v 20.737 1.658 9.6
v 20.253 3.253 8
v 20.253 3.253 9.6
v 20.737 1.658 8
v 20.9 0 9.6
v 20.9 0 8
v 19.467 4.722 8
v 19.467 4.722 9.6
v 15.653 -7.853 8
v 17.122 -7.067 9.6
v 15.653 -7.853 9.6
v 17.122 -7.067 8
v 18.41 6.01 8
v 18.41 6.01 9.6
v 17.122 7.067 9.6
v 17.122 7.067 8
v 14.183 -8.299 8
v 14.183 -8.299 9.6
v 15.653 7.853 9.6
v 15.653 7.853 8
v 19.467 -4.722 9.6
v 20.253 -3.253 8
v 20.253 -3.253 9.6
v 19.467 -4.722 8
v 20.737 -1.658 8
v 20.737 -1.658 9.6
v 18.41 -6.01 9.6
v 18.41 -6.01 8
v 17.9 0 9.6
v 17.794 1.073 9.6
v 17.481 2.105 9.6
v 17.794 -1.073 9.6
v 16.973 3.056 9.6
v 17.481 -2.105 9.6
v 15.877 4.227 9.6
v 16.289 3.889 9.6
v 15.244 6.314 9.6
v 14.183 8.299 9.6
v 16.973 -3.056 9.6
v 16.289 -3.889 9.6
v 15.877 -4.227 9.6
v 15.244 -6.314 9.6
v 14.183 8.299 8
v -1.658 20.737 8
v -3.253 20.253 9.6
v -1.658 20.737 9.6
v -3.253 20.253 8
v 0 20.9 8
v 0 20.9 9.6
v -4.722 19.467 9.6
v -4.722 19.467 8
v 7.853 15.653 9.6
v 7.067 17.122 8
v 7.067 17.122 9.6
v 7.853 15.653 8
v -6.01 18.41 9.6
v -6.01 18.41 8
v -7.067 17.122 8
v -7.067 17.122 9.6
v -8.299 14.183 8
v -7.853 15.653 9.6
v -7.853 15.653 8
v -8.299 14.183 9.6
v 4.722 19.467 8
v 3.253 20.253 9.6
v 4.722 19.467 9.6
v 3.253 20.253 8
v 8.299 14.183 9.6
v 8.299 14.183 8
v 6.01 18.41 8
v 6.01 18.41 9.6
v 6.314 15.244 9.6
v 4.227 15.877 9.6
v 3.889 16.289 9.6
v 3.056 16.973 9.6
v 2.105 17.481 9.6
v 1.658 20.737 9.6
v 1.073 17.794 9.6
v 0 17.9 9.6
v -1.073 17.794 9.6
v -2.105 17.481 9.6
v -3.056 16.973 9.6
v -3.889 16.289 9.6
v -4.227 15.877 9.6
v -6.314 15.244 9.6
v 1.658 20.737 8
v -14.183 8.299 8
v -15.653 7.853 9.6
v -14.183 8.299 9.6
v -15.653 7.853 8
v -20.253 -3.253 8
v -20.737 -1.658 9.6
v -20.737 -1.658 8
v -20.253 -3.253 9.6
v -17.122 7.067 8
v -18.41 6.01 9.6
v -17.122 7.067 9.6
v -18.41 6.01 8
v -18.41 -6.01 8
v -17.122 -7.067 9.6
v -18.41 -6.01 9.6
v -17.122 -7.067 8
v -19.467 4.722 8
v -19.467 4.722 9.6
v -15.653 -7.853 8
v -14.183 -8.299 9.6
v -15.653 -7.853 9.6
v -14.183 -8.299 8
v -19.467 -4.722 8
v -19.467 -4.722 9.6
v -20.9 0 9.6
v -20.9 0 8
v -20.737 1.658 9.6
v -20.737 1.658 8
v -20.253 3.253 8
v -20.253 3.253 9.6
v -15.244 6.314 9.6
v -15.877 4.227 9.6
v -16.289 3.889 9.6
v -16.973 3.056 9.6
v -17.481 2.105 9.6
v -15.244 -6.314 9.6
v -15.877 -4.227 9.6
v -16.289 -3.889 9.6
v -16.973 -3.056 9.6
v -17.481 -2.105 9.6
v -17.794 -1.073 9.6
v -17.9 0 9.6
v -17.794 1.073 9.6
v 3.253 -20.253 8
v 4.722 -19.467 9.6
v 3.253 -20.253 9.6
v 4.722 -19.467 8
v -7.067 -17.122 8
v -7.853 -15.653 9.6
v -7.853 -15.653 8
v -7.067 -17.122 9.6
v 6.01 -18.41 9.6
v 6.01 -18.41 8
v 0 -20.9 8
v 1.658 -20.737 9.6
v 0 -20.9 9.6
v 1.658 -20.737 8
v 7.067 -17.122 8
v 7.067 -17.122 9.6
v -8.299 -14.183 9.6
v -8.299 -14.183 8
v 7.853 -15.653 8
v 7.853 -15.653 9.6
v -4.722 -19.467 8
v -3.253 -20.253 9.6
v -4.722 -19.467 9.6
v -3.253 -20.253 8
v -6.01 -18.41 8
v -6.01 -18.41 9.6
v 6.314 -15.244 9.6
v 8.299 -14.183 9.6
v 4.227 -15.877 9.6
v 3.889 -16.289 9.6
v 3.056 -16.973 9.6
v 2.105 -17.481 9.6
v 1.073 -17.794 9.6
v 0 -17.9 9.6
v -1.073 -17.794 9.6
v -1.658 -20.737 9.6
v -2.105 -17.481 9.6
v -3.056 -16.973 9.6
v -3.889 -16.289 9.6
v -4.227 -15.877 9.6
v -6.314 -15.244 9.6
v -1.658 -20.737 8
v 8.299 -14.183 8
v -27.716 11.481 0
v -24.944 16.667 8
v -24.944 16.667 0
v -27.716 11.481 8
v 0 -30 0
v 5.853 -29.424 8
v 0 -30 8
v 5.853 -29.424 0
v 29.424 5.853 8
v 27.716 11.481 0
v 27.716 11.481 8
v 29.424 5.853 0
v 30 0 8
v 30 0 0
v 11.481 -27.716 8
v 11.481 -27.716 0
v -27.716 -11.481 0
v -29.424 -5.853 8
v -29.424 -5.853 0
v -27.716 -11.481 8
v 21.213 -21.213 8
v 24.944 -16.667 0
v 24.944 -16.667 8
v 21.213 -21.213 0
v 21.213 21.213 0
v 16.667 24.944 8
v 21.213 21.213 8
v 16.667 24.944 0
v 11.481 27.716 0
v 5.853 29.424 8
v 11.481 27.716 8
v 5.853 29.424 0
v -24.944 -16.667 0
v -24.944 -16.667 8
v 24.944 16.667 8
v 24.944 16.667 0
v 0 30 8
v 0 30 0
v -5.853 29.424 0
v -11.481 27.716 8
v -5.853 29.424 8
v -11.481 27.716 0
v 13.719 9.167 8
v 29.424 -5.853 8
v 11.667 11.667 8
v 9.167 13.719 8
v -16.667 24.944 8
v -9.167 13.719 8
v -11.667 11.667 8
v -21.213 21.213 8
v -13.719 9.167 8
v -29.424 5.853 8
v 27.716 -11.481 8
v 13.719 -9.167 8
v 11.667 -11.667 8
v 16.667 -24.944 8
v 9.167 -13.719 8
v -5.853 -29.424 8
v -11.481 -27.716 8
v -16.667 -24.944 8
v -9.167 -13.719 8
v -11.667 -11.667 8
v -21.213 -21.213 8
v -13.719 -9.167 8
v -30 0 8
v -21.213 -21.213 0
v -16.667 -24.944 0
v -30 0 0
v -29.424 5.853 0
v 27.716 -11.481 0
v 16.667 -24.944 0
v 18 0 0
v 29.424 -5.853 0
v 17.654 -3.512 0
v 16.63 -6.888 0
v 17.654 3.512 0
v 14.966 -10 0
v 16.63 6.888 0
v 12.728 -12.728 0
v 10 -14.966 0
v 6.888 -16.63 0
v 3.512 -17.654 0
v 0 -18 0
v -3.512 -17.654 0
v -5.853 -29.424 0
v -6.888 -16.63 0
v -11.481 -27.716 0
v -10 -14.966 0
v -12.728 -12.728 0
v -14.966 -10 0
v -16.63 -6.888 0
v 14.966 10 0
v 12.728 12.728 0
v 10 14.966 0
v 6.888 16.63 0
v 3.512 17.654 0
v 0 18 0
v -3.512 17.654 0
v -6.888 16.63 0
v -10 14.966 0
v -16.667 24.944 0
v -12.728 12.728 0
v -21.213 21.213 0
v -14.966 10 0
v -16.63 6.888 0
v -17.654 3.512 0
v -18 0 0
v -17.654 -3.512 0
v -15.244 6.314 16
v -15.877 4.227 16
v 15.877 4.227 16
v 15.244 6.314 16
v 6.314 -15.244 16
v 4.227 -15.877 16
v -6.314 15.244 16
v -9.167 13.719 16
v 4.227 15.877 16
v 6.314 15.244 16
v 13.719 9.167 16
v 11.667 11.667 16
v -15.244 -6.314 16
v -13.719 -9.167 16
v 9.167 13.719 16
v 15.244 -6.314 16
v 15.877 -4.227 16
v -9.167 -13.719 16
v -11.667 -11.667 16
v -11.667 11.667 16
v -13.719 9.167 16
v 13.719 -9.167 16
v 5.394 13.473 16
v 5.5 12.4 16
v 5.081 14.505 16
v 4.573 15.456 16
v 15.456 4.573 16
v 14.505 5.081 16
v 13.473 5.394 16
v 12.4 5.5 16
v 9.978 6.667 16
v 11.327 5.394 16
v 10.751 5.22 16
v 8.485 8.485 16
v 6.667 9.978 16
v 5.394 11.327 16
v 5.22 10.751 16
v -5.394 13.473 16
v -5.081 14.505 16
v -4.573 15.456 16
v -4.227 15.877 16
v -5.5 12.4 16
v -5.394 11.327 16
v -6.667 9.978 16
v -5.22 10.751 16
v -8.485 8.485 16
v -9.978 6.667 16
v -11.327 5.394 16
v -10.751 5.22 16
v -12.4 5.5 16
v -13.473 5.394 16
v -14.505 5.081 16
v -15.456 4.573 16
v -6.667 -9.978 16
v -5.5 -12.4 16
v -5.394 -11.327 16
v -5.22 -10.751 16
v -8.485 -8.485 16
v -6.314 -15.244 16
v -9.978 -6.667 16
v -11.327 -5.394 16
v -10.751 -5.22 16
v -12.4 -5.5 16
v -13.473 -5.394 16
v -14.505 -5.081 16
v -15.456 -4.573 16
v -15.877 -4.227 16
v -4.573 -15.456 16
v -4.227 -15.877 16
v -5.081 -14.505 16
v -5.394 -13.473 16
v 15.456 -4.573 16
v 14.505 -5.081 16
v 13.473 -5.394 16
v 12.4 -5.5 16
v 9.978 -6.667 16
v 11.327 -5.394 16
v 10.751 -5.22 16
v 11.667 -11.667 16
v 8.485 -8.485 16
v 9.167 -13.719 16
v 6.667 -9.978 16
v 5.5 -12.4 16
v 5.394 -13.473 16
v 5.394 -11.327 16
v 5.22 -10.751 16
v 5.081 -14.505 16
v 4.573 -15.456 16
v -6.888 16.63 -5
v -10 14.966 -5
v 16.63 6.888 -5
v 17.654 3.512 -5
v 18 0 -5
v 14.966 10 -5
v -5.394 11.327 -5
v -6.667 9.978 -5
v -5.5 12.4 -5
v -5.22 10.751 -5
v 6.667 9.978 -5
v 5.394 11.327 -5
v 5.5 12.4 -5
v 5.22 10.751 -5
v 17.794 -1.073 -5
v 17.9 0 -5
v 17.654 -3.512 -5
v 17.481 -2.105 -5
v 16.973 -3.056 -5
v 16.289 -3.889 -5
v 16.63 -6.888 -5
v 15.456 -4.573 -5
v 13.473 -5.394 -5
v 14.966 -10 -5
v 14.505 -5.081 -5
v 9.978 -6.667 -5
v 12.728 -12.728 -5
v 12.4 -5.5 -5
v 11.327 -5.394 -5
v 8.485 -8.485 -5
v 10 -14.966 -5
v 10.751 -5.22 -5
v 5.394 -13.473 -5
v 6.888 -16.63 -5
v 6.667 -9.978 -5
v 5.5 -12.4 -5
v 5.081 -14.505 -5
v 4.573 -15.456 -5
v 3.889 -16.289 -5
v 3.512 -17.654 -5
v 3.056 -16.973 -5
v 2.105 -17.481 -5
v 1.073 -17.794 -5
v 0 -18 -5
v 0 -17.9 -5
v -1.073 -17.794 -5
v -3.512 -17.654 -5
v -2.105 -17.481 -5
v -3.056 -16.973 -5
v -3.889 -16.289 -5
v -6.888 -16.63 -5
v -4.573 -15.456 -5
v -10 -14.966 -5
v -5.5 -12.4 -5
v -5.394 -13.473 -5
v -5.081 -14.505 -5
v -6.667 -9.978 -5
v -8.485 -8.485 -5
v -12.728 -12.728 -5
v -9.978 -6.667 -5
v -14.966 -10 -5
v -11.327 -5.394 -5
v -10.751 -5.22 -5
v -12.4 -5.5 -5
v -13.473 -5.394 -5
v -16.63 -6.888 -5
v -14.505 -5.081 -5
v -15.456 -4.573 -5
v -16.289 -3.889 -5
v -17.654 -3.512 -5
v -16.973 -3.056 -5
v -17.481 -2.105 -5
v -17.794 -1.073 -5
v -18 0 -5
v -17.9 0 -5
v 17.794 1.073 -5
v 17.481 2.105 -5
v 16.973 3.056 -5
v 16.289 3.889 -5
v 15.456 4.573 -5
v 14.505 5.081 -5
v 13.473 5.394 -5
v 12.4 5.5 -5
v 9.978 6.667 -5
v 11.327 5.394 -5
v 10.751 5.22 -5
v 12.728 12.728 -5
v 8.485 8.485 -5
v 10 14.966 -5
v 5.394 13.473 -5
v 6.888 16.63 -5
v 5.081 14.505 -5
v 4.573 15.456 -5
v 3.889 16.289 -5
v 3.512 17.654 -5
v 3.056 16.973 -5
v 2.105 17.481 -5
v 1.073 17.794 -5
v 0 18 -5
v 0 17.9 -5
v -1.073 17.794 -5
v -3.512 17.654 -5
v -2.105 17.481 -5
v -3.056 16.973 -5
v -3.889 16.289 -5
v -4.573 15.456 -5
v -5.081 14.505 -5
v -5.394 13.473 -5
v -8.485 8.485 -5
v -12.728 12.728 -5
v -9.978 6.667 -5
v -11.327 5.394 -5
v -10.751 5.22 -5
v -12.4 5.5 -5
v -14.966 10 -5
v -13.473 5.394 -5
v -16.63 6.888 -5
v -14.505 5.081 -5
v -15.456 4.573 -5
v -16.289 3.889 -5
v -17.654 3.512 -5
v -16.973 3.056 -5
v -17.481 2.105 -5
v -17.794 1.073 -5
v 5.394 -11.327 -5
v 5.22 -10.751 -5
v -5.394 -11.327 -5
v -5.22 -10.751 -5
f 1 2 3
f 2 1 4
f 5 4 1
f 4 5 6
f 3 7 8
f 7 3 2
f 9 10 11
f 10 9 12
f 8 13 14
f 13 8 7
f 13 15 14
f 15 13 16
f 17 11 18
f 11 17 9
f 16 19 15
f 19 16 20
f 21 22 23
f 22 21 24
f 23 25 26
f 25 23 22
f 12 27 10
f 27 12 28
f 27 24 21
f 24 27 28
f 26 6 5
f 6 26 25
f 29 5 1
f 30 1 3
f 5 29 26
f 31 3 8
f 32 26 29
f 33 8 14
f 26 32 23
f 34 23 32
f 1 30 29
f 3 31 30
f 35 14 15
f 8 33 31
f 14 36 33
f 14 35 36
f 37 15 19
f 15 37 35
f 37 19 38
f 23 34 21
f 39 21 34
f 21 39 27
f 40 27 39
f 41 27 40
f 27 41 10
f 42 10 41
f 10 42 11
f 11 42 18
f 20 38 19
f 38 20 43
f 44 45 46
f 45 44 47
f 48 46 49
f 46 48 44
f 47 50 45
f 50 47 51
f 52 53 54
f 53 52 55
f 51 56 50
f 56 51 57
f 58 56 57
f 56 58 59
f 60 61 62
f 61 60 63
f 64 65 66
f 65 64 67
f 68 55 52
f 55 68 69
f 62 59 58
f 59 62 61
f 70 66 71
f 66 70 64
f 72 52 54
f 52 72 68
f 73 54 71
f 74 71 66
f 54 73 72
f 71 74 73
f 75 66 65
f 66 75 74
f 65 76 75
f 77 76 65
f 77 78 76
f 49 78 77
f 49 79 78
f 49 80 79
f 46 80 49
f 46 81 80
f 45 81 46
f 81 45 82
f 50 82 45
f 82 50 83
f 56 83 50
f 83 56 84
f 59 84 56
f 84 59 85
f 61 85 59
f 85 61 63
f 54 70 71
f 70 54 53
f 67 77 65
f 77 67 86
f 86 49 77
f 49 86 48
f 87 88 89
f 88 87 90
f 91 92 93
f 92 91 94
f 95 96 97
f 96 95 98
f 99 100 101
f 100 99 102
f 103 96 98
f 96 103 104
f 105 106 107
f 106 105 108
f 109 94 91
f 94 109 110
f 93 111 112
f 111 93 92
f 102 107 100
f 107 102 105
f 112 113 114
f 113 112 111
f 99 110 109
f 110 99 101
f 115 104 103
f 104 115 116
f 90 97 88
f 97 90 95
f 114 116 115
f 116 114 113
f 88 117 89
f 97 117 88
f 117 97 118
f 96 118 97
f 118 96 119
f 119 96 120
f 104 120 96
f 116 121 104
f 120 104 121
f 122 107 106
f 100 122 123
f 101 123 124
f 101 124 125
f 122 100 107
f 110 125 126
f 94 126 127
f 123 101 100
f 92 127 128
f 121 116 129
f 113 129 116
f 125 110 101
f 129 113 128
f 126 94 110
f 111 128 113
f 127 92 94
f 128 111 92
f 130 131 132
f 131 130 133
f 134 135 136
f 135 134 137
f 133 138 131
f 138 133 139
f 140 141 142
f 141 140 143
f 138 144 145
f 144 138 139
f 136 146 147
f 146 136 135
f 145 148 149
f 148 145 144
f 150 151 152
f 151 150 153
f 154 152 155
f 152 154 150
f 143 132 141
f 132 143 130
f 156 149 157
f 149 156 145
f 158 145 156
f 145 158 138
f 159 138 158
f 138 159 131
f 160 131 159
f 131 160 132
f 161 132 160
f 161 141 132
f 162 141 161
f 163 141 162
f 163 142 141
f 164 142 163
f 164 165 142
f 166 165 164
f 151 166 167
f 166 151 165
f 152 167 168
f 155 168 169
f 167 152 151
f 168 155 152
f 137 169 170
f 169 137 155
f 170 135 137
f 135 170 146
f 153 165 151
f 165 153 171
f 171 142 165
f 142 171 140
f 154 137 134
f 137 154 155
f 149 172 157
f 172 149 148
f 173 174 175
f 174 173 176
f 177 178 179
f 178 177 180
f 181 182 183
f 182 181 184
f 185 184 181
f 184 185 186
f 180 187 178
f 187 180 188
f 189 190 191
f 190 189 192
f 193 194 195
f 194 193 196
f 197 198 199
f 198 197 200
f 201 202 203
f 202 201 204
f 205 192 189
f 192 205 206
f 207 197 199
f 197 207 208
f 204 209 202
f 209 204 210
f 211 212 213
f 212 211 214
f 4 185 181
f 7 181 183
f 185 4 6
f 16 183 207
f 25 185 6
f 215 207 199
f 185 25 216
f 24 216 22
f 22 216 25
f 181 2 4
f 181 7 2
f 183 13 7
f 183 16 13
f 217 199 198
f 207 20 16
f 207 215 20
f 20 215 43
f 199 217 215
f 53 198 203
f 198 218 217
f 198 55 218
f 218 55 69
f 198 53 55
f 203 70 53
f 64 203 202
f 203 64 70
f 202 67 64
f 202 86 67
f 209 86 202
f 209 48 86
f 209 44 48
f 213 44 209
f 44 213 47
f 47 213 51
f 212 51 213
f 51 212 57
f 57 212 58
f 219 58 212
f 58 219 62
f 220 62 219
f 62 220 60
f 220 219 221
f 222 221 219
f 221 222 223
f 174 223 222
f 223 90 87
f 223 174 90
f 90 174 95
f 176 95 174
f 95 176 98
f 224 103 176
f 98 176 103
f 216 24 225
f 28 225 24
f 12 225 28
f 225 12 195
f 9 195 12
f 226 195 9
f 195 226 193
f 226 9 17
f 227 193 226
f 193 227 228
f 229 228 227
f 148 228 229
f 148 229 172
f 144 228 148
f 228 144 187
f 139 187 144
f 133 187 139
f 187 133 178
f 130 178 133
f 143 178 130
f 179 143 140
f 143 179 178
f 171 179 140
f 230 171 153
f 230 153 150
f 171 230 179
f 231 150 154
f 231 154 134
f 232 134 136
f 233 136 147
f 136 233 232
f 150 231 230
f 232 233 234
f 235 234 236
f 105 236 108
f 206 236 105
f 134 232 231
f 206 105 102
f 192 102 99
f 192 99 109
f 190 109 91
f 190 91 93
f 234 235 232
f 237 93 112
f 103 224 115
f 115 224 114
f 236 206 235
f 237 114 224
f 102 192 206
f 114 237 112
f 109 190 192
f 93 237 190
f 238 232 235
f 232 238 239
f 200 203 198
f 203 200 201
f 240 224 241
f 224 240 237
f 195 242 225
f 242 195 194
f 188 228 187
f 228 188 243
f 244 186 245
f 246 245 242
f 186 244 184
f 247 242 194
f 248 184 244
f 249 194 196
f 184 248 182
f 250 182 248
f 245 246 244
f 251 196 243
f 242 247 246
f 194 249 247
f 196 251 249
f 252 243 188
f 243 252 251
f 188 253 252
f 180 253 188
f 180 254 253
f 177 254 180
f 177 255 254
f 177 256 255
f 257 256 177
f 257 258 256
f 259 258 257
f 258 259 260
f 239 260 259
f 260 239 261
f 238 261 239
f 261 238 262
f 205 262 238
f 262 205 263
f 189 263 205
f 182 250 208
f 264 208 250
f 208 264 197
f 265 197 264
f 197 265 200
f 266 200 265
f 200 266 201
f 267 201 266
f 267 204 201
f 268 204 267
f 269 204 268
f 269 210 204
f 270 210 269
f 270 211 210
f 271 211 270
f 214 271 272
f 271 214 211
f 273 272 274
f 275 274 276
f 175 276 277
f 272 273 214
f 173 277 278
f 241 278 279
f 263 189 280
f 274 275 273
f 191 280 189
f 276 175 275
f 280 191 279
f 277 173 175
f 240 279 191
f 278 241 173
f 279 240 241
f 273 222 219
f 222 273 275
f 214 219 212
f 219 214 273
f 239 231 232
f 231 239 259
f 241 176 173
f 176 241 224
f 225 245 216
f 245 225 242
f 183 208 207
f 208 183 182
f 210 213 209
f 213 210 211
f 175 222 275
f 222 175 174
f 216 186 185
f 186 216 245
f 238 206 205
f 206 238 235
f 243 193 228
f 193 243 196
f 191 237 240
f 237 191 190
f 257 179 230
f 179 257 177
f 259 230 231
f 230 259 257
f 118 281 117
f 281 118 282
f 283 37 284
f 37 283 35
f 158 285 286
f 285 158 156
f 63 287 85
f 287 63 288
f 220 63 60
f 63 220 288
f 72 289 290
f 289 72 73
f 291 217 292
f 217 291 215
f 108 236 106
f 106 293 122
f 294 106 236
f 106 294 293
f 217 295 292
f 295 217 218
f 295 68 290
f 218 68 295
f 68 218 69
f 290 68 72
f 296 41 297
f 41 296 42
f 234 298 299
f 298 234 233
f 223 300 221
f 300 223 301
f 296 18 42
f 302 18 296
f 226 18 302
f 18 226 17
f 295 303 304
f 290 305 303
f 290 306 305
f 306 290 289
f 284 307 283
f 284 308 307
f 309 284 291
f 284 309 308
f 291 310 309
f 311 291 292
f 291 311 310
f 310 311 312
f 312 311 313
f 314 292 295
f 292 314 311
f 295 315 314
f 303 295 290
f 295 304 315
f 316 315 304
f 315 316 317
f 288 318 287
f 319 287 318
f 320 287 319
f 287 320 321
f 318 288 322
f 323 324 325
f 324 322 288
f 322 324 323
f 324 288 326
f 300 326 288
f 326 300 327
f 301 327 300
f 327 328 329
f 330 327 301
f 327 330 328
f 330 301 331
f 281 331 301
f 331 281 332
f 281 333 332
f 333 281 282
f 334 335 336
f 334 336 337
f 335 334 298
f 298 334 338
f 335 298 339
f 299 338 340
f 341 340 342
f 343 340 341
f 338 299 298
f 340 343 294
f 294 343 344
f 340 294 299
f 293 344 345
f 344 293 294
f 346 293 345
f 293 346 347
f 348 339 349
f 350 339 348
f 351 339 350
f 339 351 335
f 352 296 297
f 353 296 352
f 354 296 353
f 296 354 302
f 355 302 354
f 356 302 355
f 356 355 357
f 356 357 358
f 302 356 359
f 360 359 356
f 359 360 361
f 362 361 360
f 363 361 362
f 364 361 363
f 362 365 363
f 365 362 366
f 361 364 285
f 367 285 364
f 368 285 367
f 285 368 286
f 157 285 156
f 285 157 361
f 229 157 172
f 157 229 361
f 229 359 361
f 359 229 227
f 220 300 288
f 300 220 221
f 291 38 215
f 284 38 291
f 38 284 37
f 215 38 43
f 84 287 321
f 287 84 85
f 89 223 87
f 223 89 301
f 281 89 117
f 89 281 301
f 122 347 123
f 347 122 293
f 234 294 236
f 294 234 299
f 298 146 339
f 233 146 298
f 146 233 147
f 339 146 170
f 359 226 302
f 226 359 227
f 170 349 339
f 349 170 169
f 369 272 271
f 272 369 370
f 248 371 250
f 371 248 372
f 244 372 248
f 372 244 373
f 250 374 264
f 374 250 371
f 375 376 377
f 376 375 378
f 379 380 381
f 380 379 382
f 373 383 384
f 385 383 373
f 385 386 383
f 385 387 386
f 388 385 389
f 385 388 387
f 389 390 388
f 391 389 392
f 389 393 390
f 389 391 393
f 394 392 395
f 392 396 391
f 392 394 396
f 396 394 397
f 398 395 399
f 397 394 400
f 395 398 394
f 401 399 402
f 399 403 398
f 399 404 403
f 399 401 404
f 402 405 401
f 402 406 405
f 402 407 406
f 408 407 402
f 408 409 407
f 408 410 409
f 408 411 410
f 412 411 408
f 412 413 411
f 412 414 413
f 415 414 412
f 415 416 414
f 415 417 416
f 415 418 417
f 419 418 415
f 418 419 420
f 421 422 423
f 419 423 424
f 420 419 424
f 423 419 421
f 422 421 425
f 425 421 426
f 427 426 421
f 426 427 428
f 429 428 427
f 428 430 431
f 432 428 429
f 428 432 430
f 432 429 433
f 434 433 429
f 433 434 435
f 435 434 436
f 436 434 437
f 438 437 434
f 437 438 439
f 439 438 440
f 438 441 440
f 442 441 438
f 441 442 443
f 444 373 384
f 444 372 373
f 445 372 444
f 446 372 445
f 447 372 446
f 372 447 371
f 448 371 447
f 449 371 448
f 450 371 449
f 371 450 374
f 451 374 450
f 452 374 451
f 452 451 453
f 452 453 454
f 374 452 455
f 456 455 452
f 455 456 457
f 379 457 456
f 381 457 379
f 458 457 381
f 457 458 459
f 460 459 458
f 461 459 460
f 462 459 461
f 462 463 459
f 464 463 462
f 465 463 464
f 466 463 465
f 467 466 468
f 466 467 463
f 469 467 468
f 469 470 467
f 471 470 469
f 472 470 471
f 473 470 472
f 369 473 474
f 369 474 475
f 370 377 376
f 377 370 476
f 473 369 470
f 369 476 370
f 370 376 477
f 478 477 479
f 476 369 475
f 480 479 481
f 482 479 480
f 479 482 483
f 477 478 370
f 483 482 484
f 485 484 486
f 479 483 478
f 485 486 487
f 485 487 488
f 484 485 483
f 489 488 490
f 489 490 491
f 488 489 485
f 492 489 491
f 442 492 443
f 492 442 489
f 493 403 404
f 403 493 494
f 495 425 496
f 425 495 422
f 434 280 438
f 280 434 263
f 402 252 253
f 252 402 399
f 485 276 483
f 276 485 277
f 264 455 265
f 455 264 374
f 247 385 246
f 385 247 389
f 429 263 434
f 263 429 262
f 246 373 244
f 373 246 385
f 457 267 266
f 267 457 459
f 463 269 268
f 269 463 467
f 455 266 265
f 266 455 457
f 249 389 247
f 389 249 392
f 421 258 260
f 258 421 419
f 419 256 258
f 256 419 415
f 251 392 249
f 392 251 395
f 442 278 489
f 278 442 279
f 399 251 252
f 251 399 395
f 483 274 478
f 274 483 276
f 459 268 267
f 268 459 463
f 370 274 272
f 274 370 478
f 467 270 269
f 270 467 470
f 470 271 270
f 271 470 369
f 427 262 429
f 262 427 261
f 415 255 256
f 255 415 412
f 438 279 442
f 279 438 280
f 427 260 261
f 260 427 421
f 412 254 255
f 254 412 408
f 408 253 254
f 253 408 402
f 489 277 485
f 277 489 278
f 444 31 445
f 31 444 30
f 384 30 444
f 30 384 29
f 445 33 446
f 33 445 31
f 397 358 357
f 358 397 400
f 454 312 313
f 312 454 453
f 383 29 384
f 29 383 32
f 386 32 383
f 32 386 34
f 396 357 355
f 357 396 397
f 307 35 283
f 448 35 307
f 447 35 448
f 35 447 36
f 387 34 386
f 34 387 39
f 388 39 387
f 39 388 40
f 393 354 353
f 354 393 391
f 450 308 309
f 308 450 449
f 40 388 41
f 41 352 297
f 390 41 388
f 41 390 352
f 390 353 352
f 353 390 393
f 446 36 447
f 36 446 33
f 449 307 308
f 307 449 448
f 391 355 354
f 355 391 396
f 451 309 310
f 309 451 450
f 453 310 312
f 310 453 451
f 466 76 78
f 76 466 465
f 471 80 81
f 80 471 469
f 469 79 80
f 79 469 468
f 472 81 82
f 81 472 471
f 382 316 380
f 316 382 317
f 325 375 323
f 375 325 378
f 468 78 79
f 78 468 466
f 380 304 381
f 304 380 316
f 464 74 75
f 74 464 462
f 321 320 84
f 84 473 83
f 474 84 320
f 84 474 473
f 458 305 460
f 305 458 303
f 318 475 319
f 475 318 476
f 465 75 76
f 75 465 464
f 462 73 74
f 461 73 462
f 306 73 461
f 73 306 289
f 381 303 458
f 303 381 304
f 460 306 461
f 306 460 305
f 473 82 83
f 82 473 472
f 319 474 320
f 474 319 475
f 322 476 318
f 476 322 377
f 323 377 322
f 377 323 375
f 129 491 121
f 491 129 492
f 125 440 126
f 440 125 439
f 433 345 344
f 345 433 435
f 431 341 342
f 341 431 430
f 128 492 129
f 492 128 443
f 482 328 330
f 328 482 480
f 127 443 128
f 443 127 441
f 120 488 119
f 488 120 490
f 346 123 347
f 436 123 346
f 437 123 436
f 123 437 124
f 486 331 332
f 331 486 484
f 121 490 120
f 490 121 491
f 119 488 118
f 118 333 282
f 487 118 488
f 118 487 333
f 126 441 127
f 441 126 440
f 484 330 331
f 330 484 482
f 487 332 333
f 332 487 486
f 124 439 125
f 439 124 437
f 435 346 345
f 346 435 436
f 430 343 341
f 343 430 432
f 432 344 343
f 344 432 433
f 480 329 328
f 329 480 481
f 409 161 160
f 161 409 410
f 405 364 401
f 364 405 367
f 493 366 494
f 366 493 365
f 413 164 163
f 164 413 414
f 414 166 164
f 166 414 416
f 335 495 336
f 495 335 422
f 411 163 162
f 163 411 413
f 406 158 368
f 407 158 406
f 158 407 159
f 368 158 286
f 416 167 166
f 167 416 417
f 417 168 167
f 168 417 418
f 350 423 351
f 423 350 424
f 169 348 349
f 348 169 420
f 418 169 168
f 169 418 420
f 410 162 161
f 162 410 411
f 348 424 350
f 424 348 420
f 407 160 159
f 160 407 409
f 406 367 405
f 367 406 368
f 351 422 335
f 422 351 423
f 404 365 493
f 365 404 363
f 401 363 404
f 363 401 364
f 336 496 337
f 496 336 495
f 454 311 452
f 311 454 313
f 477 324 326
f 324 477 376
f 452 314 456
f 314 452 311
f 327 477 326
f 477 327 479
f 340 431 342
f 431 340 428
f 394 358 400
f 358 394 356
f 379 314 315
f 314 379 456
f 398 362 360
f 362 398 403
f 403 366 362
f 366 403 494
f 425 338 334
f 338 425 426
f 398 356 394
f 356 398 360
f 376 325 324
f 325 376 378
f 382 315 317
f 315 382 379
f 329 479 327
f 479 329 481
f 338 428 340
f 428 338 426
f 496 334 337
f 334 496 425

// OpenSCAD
$fn = 32;

// ----------------------------------------------------------------------
// Bolt-circle flange: 60 mm outside, 4 bolt holes, bore 24 mm
// ----------------------------------------------------------------------

// --- parameters (mm) ---
flange_d = 60;            // flange outside diameter
flange_t = 8;             // flange thickness
bolts = 4;                // number of bolt holes
bolt_d = 11;              // bolt clearance
bolt_r = 12.4;            // bolt circle radius
bore_d = 24;              // centre bore
hub_d = 33;               // raised hub diameter
hub_h = 8;                // raised hub height
spigot_d = 36;            // spigot diameter
spigot_h = 6;             // spigot height below the flange
sink = 1;                 // overlap into the flange
spot_d = 17;              // spot faced bosses
spot_h = 1.6;             // spot face height

module body() {
  cylinder(h = flange_t, d = flange_d);
  /* raised hub, sunk 1 mm into the flange */
  translate([0, 0, flange_t - 1]) cylinder(h = hub_h + 1, d = hub_d);
  /* spigot on the back face, sunk into the flange */
  translate([0, 0, -spigot_h + sink]) cylinder(h = spigot_h, d = spigot_d);
  /* spot faced pads under the bolt heads */
  for (i = [0 : bolts - 1]) rotate([0, 0, i * 360 / bolts]) translate([bolt_r, 0, flange_t - 1]) cylinder(h = spot_h + 1, d = spot_d);
}

difference() {
  body();
  /* bolt circle */
  for (i = [0 : bolts - 1]) rotate([0, 0, i * 360 / bolts]) translate([bolt_r, 0, -spigot_h - 1]) cylinder(h = flange_t + hub_h + spigot_h + 3, d = bolt_d);
  translate([0, 0, -spigot_h - 1]) cylinder(h = flange_t + hub_h + spigot_h + 3, d = bore_d);
}
